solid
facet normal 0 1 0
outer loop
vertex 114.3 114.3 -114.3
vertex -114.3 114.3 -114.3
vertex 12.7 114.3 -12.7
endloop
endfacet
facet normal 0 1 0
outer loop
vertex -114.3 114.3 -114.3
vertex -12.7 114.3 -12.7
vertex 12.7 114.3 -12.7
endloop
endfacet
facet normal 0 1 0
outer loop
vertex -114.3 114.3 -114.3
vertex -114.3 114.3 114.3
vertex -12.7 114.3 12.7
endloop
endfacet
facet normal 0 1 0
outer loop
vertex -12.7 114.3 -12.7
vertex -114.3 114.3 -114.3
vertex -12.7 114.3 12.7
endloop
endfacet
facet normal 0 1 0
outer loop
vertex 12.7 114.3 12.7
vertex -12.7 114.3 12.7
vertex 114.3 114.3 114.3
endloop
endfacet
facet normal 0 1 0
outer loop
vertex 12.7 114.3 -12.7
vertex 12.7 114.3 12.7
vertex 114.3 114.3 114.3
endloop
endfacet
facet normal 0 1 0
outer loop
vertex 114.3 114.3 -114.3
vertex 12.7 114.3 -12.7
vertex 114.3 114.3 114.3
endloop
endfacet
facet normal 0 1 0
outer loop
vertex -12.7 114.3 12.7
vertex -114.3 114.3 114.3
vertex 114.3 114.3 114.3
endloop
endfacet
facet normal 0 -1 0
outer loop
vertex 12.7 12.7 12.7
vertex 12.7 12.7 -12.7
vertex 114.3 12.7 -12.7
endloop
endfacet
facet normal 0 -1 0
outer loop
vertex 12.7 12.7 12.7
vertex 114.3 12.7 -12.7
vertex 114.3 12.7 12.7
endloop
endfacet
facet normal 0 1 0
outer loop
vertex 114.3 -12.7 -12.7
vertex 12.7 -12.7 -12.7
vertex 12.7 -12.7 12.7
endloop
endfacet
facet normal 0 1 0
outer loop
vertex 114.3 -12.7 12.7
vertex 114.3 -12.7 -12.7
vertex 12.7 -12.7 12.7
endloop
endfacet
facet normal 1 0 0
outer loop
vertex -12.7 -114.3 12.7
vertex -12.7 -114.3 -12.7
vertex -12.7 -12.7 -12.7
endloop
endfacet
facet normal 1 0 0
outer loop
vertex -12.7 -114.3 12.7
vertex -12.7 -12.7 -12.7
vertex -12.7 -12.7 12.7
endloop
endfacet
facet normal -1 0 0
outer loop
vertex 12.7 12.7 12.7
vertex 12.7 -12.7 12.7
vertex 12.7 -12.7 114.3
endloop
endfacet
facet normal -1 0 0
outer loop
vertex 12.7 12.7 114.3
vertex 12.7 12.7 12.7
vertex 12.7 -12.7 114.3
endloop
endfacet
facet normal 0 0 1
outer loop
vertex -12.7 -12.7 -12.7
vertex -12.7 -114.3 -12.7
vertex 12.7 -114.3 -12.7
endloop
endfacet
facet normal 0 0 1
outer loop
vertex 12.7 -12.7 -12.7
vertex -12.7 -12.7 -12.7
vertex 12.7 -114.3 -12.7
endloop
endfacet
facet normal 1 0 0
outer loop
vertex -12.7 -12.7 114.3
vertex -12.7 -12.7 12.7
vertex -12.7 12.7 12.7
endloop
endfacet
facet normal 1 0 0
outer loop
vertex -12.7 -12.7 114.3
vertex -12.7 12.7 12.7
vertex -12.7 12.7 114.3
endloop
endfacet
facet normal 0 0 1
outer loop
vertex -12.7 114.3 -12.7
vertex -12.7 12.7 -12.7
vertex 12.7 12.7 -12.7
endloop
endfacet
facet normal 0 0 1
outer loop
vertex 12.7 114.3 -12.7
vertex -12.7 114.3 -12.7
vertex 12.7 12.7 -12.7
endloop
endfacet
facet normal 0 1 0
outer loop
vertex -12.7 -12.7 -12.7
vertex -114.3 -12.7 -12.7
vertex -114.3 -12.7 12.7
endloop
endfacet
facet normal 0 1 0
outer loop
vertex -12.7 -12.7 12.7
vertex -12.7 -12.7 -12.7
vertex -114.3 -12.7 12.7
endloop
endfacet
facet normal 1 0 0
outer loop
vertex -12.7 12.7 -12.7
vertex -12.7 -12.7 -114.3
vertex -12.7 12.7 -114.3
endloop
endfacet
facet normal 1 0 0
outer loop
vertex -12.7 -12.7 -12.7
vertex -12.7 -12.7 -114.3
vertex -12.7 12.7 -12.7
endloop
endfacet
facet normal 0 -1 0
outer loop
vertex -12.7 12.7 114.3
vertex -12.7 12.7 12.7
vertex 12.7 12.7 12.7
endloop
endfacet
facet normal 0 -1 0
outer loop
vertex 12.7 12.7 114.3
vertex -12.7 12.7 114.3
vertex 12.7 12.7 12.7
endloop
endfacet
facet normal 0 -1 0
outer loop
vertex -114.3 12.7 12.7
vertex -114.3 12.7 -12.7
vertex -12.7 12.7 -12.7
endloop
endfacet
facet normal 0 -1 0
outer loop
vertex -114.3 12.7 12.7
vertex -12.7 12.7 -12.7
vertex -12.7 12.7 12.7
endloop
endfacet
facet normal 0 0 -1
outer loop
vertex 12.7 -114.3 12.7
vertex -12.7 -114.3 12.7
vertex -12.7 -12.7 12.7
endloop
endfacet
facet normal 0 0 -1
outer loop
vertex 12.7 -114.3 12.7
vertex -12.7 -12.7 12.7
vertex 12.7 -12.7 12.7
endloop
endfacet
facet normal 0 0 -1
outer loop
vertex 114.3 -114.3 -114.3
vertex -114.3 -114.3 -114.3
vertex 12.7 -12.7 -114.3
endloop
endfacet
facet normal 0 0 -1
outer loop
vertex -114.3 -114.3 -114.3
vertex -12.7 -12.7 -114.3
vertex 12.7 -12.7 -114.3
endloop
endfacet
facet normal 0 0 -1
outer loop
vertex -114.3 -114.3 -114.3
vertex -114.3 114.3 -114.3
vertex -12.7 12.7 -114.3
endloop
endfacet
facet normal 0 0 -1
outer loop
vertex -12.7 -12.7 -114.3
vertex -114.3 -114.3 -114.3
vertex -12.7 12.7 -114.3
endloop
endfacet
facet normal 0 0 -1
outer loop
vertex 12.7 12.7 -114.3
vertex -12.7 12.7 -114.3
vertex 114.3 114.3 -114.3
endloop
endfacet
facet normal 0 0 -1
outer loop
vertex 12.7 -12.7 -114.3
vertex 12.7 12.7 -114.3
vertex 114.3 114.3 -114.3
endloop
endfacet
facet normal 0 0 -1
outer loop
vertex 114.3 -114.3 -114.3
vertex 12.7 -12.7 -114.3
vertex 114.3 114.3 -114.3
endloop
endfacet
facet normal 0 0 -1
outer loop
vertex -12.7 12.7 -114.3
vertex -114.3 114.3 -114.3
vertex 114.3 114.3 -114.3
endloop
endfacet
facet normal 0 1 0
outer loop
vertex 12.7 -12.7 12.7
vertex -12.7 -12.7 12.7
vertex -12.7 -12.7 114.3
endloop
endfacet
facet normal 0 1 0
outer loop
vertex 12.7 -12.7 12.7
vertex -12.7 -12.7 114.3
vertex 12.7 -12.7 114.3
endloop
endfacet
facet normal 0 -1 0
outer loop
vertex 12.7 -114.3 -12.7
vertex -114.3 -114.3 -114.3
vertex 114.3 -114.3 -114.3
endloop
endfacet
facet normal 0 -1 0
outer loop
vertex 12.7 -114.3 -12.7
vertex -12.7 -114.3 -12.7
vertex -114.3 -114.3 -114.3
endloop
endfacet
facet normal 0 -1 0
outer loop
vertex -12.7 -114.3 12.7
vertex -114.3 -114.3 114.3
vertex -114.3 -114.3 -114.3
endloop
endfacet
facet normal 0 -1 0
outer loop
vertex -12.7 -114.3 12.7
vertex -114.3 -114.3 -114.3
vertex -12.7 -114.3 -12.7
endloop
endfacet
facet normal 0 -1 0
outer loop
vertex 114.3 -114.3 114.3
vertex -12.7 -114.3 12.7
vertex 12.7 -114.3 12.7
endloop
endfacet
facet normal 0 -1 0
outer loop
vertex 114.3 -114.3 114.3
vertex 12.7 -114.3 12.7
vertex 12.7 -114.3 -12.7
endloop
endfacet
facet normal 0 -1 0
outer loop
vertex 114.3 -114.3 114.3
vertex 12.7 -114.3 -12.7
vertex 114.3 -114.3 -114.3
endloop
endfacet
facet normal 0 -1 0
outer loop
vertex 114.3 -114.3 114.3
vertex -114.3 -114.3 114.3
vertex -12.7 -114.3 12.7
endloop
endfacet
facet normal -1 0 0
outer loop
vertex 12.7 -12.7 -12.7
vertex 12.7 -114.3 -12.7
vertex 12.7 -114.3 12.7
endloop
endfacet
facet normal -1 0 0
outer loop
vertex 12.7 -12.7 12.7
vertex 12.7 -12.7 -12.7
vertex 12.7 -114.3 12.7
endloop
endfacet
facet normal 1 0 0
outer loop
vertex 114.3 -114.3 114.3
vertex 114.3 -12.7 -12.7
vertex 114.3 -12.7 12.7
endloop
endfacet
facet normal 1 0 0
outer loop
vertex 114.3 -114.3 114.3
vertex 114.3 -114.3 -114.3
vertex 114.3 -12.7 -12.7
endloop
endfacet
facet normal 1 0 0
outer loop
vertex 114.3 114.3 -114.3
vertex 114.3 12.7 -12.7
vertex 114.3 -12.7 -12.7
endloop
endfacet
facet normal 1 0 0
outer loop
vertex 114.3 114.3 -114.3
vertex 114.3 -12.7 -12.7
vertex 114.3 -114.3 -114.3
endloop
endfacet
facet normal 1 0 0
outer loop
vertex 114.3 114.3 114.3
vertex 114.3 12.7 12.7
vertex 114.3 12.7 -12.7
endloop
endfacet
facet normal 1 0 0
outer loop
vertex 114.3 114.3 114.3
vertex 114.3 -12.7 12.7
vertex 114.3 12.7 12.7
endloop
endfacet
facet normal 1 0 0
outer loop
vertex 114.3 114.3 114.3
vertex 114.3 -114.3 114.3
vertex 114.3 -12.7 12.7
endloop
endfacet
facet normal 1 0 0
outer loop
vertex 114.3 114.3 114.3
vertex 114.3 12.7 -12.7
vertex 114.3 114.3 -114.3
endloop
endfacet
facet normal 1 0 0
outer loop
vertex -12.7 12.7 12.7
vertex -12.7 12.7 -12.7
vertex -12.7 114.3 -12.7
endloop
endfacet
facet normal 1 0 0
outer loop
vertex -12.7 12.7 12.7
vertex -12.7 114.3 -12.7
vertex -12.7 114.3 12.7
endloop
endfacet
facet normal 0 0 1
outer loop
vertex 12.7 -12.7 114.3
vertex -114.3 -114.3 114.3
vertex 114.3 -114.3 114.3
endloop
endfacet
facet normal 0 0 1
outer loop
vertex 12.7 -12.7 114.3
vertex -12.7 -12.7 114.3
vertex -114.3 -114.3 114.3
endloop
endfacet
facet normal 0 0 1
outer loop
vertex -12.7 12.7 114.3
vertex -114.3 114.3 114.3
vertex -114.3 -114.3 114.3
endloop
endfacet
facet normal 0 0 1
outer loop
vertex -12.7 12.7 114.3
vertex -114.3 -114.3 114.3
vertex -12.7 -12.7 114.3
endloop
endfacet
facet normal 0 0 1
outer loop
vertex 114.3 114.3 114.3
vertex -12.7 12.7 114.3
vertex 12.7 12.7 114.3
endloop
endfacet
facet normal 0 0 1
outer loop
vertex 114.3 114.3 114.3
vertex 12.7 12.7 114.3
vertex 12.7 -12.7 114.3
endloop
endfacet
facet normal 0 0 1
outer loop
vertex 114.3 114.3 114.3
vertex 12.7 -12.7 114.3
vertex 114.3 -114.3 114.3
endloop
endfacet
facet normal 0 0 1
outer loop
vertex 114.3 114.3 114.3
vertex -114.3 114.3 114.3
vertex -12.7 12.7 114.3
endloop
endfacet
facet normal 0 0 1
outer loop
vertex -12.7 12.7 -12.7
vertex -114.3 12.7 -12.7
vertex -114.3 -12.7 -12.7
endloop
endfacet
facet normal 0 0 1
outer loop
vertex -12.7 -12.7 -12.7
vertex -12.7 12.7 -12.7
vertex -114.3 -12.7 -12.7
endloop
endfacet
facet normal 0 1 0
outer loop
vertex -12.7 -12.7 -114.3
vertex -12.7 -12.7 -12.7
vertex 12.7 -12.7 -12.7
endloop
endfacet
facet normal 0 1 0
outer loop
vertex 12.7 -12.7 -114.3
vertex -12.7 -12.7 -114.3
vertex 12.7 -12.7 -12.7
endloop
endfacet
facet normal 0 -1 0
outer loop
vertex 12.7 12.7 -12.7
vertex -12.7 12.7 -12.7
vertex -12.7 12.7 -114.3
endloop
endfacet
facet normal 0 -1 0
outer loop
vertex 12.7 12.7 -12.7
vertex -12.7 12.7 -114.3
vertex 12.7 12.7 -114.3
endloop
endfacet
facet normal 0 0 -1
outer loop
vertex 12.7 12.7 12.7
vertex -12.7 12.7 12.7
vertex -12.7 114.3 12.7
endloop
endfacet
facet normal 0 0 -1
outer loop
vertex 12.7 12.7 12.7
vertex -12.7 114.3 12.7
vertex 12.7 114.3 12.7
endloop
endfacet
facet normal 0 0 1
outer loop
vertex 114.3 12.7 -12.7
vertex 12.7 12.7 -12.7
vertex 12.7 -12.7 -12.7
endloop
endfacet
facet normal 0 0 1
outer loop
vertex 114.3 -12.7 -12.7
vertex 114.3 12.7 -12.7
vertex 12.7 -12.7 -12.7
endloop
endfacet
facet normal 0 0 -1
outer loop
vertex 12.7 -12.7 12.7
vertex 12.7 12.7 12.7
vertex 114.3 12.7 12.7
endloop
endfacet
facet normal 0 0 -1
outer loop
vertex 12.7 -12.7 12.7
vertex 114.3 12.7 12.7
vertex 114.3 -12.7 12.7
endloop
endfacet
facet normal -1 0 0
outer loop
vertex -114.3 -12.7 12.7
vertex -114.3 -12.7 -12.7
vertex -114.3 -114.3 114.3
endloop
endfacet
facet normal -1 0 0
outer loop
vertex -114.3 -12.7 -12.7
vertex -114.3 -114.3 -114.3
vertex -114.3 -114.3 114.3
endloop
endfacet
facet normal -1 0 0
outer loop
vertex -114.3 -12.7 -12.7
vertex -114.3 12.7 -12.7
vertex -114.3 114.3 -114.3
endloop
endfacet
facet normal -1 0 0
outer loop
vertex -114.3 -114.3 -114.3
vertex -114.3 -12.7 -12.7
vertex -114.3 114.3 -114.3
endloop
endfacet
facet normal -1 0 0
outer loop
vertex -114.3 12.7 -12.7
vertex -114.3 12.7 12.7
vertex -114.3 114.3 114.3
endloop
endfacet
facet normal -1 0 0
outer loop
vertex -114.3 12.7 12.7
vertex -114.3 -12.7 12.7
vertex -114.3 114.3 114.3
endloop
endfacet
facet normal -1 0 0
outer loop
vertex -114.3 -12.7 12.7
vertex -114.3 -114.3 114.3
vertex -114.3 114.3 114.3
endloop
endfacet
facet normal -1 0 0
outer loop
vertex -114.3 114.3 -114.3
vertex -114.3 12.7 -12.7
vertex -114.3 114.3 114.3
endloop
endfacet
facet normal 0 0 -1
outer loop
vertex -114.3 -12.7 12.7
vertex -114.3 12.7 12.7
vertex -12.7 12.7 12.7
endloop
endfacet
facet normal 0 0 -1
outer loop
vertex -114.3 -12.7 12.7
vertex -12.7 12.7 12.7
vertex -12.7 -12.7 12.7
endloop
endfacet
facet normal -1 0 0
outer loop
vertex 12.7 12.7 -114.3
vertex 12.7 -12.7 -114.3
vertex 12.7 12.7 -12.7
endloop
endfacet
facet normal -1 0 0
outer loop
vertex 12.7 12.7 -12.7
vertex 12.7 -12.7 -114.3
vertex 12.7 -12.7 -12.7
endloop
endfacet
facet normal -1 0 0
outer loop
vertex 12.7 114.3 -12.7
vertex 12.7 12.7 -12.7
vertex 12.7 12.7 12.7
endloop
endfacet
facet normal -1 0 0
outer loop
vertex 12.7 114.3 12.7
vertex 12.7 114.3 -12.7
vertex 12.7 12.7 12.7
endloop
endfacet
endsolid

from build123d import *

# Parameters (mm, degrees)
F0_W     = 228.6
F0_H     = 228.6
F0_W_2   = 25.4
F0_H_2   = 25.4
F1_DEPTH = 114.3
F2_DEPTH = 114.3
F3_W     = 25.4
F3_H     = 25.4
F4_DEPTH = 228.6
F5_W     = 25.4
F5_H     = 25.4
F6_DEPTH = 228.6


with BuildPart() as f1:
    # F0 (on Top) → F1 (new body)
    with BuildSketch(Plane.XY):
        Rectangle(F0_W, F0_H)
        Rectangle(F0_W_2, F0_H_2, mode=Mode.SUBTRACT)
    extrude(amount=F1_DEPTH)

    # F0 (on Top) → F2 (join)
    with BuildSketch(Plane.XY):
        Rectangle(F0_W, F0_H)
        Rectangle(F0_W_2, F0_H_2, mode=Mode.SUBTRACT)
    extrude(amount=-F2_DEPTH)

    # F3 (on face) → F4 (cut)
    with BuildSketch(Plane.XZ.offset(114.3)):
        Rectangle(F3_W, F3_H)
    extrude(amount=-F4_DEPTH, mode=Mode.SUBTRACT)

    # F5 (on face) → F6 (cut)
    with BuildSketch(Plane(origin=(-114.3, 0, 0), x_dir=(0, -1, 0), z_dir=(-1, 0, 0))):
        Rectangle(F5_W, F5_H)
    extrude(amount=-F6_DEPTH, mode=Mode.SUBTRACT)


solid = f1.part
